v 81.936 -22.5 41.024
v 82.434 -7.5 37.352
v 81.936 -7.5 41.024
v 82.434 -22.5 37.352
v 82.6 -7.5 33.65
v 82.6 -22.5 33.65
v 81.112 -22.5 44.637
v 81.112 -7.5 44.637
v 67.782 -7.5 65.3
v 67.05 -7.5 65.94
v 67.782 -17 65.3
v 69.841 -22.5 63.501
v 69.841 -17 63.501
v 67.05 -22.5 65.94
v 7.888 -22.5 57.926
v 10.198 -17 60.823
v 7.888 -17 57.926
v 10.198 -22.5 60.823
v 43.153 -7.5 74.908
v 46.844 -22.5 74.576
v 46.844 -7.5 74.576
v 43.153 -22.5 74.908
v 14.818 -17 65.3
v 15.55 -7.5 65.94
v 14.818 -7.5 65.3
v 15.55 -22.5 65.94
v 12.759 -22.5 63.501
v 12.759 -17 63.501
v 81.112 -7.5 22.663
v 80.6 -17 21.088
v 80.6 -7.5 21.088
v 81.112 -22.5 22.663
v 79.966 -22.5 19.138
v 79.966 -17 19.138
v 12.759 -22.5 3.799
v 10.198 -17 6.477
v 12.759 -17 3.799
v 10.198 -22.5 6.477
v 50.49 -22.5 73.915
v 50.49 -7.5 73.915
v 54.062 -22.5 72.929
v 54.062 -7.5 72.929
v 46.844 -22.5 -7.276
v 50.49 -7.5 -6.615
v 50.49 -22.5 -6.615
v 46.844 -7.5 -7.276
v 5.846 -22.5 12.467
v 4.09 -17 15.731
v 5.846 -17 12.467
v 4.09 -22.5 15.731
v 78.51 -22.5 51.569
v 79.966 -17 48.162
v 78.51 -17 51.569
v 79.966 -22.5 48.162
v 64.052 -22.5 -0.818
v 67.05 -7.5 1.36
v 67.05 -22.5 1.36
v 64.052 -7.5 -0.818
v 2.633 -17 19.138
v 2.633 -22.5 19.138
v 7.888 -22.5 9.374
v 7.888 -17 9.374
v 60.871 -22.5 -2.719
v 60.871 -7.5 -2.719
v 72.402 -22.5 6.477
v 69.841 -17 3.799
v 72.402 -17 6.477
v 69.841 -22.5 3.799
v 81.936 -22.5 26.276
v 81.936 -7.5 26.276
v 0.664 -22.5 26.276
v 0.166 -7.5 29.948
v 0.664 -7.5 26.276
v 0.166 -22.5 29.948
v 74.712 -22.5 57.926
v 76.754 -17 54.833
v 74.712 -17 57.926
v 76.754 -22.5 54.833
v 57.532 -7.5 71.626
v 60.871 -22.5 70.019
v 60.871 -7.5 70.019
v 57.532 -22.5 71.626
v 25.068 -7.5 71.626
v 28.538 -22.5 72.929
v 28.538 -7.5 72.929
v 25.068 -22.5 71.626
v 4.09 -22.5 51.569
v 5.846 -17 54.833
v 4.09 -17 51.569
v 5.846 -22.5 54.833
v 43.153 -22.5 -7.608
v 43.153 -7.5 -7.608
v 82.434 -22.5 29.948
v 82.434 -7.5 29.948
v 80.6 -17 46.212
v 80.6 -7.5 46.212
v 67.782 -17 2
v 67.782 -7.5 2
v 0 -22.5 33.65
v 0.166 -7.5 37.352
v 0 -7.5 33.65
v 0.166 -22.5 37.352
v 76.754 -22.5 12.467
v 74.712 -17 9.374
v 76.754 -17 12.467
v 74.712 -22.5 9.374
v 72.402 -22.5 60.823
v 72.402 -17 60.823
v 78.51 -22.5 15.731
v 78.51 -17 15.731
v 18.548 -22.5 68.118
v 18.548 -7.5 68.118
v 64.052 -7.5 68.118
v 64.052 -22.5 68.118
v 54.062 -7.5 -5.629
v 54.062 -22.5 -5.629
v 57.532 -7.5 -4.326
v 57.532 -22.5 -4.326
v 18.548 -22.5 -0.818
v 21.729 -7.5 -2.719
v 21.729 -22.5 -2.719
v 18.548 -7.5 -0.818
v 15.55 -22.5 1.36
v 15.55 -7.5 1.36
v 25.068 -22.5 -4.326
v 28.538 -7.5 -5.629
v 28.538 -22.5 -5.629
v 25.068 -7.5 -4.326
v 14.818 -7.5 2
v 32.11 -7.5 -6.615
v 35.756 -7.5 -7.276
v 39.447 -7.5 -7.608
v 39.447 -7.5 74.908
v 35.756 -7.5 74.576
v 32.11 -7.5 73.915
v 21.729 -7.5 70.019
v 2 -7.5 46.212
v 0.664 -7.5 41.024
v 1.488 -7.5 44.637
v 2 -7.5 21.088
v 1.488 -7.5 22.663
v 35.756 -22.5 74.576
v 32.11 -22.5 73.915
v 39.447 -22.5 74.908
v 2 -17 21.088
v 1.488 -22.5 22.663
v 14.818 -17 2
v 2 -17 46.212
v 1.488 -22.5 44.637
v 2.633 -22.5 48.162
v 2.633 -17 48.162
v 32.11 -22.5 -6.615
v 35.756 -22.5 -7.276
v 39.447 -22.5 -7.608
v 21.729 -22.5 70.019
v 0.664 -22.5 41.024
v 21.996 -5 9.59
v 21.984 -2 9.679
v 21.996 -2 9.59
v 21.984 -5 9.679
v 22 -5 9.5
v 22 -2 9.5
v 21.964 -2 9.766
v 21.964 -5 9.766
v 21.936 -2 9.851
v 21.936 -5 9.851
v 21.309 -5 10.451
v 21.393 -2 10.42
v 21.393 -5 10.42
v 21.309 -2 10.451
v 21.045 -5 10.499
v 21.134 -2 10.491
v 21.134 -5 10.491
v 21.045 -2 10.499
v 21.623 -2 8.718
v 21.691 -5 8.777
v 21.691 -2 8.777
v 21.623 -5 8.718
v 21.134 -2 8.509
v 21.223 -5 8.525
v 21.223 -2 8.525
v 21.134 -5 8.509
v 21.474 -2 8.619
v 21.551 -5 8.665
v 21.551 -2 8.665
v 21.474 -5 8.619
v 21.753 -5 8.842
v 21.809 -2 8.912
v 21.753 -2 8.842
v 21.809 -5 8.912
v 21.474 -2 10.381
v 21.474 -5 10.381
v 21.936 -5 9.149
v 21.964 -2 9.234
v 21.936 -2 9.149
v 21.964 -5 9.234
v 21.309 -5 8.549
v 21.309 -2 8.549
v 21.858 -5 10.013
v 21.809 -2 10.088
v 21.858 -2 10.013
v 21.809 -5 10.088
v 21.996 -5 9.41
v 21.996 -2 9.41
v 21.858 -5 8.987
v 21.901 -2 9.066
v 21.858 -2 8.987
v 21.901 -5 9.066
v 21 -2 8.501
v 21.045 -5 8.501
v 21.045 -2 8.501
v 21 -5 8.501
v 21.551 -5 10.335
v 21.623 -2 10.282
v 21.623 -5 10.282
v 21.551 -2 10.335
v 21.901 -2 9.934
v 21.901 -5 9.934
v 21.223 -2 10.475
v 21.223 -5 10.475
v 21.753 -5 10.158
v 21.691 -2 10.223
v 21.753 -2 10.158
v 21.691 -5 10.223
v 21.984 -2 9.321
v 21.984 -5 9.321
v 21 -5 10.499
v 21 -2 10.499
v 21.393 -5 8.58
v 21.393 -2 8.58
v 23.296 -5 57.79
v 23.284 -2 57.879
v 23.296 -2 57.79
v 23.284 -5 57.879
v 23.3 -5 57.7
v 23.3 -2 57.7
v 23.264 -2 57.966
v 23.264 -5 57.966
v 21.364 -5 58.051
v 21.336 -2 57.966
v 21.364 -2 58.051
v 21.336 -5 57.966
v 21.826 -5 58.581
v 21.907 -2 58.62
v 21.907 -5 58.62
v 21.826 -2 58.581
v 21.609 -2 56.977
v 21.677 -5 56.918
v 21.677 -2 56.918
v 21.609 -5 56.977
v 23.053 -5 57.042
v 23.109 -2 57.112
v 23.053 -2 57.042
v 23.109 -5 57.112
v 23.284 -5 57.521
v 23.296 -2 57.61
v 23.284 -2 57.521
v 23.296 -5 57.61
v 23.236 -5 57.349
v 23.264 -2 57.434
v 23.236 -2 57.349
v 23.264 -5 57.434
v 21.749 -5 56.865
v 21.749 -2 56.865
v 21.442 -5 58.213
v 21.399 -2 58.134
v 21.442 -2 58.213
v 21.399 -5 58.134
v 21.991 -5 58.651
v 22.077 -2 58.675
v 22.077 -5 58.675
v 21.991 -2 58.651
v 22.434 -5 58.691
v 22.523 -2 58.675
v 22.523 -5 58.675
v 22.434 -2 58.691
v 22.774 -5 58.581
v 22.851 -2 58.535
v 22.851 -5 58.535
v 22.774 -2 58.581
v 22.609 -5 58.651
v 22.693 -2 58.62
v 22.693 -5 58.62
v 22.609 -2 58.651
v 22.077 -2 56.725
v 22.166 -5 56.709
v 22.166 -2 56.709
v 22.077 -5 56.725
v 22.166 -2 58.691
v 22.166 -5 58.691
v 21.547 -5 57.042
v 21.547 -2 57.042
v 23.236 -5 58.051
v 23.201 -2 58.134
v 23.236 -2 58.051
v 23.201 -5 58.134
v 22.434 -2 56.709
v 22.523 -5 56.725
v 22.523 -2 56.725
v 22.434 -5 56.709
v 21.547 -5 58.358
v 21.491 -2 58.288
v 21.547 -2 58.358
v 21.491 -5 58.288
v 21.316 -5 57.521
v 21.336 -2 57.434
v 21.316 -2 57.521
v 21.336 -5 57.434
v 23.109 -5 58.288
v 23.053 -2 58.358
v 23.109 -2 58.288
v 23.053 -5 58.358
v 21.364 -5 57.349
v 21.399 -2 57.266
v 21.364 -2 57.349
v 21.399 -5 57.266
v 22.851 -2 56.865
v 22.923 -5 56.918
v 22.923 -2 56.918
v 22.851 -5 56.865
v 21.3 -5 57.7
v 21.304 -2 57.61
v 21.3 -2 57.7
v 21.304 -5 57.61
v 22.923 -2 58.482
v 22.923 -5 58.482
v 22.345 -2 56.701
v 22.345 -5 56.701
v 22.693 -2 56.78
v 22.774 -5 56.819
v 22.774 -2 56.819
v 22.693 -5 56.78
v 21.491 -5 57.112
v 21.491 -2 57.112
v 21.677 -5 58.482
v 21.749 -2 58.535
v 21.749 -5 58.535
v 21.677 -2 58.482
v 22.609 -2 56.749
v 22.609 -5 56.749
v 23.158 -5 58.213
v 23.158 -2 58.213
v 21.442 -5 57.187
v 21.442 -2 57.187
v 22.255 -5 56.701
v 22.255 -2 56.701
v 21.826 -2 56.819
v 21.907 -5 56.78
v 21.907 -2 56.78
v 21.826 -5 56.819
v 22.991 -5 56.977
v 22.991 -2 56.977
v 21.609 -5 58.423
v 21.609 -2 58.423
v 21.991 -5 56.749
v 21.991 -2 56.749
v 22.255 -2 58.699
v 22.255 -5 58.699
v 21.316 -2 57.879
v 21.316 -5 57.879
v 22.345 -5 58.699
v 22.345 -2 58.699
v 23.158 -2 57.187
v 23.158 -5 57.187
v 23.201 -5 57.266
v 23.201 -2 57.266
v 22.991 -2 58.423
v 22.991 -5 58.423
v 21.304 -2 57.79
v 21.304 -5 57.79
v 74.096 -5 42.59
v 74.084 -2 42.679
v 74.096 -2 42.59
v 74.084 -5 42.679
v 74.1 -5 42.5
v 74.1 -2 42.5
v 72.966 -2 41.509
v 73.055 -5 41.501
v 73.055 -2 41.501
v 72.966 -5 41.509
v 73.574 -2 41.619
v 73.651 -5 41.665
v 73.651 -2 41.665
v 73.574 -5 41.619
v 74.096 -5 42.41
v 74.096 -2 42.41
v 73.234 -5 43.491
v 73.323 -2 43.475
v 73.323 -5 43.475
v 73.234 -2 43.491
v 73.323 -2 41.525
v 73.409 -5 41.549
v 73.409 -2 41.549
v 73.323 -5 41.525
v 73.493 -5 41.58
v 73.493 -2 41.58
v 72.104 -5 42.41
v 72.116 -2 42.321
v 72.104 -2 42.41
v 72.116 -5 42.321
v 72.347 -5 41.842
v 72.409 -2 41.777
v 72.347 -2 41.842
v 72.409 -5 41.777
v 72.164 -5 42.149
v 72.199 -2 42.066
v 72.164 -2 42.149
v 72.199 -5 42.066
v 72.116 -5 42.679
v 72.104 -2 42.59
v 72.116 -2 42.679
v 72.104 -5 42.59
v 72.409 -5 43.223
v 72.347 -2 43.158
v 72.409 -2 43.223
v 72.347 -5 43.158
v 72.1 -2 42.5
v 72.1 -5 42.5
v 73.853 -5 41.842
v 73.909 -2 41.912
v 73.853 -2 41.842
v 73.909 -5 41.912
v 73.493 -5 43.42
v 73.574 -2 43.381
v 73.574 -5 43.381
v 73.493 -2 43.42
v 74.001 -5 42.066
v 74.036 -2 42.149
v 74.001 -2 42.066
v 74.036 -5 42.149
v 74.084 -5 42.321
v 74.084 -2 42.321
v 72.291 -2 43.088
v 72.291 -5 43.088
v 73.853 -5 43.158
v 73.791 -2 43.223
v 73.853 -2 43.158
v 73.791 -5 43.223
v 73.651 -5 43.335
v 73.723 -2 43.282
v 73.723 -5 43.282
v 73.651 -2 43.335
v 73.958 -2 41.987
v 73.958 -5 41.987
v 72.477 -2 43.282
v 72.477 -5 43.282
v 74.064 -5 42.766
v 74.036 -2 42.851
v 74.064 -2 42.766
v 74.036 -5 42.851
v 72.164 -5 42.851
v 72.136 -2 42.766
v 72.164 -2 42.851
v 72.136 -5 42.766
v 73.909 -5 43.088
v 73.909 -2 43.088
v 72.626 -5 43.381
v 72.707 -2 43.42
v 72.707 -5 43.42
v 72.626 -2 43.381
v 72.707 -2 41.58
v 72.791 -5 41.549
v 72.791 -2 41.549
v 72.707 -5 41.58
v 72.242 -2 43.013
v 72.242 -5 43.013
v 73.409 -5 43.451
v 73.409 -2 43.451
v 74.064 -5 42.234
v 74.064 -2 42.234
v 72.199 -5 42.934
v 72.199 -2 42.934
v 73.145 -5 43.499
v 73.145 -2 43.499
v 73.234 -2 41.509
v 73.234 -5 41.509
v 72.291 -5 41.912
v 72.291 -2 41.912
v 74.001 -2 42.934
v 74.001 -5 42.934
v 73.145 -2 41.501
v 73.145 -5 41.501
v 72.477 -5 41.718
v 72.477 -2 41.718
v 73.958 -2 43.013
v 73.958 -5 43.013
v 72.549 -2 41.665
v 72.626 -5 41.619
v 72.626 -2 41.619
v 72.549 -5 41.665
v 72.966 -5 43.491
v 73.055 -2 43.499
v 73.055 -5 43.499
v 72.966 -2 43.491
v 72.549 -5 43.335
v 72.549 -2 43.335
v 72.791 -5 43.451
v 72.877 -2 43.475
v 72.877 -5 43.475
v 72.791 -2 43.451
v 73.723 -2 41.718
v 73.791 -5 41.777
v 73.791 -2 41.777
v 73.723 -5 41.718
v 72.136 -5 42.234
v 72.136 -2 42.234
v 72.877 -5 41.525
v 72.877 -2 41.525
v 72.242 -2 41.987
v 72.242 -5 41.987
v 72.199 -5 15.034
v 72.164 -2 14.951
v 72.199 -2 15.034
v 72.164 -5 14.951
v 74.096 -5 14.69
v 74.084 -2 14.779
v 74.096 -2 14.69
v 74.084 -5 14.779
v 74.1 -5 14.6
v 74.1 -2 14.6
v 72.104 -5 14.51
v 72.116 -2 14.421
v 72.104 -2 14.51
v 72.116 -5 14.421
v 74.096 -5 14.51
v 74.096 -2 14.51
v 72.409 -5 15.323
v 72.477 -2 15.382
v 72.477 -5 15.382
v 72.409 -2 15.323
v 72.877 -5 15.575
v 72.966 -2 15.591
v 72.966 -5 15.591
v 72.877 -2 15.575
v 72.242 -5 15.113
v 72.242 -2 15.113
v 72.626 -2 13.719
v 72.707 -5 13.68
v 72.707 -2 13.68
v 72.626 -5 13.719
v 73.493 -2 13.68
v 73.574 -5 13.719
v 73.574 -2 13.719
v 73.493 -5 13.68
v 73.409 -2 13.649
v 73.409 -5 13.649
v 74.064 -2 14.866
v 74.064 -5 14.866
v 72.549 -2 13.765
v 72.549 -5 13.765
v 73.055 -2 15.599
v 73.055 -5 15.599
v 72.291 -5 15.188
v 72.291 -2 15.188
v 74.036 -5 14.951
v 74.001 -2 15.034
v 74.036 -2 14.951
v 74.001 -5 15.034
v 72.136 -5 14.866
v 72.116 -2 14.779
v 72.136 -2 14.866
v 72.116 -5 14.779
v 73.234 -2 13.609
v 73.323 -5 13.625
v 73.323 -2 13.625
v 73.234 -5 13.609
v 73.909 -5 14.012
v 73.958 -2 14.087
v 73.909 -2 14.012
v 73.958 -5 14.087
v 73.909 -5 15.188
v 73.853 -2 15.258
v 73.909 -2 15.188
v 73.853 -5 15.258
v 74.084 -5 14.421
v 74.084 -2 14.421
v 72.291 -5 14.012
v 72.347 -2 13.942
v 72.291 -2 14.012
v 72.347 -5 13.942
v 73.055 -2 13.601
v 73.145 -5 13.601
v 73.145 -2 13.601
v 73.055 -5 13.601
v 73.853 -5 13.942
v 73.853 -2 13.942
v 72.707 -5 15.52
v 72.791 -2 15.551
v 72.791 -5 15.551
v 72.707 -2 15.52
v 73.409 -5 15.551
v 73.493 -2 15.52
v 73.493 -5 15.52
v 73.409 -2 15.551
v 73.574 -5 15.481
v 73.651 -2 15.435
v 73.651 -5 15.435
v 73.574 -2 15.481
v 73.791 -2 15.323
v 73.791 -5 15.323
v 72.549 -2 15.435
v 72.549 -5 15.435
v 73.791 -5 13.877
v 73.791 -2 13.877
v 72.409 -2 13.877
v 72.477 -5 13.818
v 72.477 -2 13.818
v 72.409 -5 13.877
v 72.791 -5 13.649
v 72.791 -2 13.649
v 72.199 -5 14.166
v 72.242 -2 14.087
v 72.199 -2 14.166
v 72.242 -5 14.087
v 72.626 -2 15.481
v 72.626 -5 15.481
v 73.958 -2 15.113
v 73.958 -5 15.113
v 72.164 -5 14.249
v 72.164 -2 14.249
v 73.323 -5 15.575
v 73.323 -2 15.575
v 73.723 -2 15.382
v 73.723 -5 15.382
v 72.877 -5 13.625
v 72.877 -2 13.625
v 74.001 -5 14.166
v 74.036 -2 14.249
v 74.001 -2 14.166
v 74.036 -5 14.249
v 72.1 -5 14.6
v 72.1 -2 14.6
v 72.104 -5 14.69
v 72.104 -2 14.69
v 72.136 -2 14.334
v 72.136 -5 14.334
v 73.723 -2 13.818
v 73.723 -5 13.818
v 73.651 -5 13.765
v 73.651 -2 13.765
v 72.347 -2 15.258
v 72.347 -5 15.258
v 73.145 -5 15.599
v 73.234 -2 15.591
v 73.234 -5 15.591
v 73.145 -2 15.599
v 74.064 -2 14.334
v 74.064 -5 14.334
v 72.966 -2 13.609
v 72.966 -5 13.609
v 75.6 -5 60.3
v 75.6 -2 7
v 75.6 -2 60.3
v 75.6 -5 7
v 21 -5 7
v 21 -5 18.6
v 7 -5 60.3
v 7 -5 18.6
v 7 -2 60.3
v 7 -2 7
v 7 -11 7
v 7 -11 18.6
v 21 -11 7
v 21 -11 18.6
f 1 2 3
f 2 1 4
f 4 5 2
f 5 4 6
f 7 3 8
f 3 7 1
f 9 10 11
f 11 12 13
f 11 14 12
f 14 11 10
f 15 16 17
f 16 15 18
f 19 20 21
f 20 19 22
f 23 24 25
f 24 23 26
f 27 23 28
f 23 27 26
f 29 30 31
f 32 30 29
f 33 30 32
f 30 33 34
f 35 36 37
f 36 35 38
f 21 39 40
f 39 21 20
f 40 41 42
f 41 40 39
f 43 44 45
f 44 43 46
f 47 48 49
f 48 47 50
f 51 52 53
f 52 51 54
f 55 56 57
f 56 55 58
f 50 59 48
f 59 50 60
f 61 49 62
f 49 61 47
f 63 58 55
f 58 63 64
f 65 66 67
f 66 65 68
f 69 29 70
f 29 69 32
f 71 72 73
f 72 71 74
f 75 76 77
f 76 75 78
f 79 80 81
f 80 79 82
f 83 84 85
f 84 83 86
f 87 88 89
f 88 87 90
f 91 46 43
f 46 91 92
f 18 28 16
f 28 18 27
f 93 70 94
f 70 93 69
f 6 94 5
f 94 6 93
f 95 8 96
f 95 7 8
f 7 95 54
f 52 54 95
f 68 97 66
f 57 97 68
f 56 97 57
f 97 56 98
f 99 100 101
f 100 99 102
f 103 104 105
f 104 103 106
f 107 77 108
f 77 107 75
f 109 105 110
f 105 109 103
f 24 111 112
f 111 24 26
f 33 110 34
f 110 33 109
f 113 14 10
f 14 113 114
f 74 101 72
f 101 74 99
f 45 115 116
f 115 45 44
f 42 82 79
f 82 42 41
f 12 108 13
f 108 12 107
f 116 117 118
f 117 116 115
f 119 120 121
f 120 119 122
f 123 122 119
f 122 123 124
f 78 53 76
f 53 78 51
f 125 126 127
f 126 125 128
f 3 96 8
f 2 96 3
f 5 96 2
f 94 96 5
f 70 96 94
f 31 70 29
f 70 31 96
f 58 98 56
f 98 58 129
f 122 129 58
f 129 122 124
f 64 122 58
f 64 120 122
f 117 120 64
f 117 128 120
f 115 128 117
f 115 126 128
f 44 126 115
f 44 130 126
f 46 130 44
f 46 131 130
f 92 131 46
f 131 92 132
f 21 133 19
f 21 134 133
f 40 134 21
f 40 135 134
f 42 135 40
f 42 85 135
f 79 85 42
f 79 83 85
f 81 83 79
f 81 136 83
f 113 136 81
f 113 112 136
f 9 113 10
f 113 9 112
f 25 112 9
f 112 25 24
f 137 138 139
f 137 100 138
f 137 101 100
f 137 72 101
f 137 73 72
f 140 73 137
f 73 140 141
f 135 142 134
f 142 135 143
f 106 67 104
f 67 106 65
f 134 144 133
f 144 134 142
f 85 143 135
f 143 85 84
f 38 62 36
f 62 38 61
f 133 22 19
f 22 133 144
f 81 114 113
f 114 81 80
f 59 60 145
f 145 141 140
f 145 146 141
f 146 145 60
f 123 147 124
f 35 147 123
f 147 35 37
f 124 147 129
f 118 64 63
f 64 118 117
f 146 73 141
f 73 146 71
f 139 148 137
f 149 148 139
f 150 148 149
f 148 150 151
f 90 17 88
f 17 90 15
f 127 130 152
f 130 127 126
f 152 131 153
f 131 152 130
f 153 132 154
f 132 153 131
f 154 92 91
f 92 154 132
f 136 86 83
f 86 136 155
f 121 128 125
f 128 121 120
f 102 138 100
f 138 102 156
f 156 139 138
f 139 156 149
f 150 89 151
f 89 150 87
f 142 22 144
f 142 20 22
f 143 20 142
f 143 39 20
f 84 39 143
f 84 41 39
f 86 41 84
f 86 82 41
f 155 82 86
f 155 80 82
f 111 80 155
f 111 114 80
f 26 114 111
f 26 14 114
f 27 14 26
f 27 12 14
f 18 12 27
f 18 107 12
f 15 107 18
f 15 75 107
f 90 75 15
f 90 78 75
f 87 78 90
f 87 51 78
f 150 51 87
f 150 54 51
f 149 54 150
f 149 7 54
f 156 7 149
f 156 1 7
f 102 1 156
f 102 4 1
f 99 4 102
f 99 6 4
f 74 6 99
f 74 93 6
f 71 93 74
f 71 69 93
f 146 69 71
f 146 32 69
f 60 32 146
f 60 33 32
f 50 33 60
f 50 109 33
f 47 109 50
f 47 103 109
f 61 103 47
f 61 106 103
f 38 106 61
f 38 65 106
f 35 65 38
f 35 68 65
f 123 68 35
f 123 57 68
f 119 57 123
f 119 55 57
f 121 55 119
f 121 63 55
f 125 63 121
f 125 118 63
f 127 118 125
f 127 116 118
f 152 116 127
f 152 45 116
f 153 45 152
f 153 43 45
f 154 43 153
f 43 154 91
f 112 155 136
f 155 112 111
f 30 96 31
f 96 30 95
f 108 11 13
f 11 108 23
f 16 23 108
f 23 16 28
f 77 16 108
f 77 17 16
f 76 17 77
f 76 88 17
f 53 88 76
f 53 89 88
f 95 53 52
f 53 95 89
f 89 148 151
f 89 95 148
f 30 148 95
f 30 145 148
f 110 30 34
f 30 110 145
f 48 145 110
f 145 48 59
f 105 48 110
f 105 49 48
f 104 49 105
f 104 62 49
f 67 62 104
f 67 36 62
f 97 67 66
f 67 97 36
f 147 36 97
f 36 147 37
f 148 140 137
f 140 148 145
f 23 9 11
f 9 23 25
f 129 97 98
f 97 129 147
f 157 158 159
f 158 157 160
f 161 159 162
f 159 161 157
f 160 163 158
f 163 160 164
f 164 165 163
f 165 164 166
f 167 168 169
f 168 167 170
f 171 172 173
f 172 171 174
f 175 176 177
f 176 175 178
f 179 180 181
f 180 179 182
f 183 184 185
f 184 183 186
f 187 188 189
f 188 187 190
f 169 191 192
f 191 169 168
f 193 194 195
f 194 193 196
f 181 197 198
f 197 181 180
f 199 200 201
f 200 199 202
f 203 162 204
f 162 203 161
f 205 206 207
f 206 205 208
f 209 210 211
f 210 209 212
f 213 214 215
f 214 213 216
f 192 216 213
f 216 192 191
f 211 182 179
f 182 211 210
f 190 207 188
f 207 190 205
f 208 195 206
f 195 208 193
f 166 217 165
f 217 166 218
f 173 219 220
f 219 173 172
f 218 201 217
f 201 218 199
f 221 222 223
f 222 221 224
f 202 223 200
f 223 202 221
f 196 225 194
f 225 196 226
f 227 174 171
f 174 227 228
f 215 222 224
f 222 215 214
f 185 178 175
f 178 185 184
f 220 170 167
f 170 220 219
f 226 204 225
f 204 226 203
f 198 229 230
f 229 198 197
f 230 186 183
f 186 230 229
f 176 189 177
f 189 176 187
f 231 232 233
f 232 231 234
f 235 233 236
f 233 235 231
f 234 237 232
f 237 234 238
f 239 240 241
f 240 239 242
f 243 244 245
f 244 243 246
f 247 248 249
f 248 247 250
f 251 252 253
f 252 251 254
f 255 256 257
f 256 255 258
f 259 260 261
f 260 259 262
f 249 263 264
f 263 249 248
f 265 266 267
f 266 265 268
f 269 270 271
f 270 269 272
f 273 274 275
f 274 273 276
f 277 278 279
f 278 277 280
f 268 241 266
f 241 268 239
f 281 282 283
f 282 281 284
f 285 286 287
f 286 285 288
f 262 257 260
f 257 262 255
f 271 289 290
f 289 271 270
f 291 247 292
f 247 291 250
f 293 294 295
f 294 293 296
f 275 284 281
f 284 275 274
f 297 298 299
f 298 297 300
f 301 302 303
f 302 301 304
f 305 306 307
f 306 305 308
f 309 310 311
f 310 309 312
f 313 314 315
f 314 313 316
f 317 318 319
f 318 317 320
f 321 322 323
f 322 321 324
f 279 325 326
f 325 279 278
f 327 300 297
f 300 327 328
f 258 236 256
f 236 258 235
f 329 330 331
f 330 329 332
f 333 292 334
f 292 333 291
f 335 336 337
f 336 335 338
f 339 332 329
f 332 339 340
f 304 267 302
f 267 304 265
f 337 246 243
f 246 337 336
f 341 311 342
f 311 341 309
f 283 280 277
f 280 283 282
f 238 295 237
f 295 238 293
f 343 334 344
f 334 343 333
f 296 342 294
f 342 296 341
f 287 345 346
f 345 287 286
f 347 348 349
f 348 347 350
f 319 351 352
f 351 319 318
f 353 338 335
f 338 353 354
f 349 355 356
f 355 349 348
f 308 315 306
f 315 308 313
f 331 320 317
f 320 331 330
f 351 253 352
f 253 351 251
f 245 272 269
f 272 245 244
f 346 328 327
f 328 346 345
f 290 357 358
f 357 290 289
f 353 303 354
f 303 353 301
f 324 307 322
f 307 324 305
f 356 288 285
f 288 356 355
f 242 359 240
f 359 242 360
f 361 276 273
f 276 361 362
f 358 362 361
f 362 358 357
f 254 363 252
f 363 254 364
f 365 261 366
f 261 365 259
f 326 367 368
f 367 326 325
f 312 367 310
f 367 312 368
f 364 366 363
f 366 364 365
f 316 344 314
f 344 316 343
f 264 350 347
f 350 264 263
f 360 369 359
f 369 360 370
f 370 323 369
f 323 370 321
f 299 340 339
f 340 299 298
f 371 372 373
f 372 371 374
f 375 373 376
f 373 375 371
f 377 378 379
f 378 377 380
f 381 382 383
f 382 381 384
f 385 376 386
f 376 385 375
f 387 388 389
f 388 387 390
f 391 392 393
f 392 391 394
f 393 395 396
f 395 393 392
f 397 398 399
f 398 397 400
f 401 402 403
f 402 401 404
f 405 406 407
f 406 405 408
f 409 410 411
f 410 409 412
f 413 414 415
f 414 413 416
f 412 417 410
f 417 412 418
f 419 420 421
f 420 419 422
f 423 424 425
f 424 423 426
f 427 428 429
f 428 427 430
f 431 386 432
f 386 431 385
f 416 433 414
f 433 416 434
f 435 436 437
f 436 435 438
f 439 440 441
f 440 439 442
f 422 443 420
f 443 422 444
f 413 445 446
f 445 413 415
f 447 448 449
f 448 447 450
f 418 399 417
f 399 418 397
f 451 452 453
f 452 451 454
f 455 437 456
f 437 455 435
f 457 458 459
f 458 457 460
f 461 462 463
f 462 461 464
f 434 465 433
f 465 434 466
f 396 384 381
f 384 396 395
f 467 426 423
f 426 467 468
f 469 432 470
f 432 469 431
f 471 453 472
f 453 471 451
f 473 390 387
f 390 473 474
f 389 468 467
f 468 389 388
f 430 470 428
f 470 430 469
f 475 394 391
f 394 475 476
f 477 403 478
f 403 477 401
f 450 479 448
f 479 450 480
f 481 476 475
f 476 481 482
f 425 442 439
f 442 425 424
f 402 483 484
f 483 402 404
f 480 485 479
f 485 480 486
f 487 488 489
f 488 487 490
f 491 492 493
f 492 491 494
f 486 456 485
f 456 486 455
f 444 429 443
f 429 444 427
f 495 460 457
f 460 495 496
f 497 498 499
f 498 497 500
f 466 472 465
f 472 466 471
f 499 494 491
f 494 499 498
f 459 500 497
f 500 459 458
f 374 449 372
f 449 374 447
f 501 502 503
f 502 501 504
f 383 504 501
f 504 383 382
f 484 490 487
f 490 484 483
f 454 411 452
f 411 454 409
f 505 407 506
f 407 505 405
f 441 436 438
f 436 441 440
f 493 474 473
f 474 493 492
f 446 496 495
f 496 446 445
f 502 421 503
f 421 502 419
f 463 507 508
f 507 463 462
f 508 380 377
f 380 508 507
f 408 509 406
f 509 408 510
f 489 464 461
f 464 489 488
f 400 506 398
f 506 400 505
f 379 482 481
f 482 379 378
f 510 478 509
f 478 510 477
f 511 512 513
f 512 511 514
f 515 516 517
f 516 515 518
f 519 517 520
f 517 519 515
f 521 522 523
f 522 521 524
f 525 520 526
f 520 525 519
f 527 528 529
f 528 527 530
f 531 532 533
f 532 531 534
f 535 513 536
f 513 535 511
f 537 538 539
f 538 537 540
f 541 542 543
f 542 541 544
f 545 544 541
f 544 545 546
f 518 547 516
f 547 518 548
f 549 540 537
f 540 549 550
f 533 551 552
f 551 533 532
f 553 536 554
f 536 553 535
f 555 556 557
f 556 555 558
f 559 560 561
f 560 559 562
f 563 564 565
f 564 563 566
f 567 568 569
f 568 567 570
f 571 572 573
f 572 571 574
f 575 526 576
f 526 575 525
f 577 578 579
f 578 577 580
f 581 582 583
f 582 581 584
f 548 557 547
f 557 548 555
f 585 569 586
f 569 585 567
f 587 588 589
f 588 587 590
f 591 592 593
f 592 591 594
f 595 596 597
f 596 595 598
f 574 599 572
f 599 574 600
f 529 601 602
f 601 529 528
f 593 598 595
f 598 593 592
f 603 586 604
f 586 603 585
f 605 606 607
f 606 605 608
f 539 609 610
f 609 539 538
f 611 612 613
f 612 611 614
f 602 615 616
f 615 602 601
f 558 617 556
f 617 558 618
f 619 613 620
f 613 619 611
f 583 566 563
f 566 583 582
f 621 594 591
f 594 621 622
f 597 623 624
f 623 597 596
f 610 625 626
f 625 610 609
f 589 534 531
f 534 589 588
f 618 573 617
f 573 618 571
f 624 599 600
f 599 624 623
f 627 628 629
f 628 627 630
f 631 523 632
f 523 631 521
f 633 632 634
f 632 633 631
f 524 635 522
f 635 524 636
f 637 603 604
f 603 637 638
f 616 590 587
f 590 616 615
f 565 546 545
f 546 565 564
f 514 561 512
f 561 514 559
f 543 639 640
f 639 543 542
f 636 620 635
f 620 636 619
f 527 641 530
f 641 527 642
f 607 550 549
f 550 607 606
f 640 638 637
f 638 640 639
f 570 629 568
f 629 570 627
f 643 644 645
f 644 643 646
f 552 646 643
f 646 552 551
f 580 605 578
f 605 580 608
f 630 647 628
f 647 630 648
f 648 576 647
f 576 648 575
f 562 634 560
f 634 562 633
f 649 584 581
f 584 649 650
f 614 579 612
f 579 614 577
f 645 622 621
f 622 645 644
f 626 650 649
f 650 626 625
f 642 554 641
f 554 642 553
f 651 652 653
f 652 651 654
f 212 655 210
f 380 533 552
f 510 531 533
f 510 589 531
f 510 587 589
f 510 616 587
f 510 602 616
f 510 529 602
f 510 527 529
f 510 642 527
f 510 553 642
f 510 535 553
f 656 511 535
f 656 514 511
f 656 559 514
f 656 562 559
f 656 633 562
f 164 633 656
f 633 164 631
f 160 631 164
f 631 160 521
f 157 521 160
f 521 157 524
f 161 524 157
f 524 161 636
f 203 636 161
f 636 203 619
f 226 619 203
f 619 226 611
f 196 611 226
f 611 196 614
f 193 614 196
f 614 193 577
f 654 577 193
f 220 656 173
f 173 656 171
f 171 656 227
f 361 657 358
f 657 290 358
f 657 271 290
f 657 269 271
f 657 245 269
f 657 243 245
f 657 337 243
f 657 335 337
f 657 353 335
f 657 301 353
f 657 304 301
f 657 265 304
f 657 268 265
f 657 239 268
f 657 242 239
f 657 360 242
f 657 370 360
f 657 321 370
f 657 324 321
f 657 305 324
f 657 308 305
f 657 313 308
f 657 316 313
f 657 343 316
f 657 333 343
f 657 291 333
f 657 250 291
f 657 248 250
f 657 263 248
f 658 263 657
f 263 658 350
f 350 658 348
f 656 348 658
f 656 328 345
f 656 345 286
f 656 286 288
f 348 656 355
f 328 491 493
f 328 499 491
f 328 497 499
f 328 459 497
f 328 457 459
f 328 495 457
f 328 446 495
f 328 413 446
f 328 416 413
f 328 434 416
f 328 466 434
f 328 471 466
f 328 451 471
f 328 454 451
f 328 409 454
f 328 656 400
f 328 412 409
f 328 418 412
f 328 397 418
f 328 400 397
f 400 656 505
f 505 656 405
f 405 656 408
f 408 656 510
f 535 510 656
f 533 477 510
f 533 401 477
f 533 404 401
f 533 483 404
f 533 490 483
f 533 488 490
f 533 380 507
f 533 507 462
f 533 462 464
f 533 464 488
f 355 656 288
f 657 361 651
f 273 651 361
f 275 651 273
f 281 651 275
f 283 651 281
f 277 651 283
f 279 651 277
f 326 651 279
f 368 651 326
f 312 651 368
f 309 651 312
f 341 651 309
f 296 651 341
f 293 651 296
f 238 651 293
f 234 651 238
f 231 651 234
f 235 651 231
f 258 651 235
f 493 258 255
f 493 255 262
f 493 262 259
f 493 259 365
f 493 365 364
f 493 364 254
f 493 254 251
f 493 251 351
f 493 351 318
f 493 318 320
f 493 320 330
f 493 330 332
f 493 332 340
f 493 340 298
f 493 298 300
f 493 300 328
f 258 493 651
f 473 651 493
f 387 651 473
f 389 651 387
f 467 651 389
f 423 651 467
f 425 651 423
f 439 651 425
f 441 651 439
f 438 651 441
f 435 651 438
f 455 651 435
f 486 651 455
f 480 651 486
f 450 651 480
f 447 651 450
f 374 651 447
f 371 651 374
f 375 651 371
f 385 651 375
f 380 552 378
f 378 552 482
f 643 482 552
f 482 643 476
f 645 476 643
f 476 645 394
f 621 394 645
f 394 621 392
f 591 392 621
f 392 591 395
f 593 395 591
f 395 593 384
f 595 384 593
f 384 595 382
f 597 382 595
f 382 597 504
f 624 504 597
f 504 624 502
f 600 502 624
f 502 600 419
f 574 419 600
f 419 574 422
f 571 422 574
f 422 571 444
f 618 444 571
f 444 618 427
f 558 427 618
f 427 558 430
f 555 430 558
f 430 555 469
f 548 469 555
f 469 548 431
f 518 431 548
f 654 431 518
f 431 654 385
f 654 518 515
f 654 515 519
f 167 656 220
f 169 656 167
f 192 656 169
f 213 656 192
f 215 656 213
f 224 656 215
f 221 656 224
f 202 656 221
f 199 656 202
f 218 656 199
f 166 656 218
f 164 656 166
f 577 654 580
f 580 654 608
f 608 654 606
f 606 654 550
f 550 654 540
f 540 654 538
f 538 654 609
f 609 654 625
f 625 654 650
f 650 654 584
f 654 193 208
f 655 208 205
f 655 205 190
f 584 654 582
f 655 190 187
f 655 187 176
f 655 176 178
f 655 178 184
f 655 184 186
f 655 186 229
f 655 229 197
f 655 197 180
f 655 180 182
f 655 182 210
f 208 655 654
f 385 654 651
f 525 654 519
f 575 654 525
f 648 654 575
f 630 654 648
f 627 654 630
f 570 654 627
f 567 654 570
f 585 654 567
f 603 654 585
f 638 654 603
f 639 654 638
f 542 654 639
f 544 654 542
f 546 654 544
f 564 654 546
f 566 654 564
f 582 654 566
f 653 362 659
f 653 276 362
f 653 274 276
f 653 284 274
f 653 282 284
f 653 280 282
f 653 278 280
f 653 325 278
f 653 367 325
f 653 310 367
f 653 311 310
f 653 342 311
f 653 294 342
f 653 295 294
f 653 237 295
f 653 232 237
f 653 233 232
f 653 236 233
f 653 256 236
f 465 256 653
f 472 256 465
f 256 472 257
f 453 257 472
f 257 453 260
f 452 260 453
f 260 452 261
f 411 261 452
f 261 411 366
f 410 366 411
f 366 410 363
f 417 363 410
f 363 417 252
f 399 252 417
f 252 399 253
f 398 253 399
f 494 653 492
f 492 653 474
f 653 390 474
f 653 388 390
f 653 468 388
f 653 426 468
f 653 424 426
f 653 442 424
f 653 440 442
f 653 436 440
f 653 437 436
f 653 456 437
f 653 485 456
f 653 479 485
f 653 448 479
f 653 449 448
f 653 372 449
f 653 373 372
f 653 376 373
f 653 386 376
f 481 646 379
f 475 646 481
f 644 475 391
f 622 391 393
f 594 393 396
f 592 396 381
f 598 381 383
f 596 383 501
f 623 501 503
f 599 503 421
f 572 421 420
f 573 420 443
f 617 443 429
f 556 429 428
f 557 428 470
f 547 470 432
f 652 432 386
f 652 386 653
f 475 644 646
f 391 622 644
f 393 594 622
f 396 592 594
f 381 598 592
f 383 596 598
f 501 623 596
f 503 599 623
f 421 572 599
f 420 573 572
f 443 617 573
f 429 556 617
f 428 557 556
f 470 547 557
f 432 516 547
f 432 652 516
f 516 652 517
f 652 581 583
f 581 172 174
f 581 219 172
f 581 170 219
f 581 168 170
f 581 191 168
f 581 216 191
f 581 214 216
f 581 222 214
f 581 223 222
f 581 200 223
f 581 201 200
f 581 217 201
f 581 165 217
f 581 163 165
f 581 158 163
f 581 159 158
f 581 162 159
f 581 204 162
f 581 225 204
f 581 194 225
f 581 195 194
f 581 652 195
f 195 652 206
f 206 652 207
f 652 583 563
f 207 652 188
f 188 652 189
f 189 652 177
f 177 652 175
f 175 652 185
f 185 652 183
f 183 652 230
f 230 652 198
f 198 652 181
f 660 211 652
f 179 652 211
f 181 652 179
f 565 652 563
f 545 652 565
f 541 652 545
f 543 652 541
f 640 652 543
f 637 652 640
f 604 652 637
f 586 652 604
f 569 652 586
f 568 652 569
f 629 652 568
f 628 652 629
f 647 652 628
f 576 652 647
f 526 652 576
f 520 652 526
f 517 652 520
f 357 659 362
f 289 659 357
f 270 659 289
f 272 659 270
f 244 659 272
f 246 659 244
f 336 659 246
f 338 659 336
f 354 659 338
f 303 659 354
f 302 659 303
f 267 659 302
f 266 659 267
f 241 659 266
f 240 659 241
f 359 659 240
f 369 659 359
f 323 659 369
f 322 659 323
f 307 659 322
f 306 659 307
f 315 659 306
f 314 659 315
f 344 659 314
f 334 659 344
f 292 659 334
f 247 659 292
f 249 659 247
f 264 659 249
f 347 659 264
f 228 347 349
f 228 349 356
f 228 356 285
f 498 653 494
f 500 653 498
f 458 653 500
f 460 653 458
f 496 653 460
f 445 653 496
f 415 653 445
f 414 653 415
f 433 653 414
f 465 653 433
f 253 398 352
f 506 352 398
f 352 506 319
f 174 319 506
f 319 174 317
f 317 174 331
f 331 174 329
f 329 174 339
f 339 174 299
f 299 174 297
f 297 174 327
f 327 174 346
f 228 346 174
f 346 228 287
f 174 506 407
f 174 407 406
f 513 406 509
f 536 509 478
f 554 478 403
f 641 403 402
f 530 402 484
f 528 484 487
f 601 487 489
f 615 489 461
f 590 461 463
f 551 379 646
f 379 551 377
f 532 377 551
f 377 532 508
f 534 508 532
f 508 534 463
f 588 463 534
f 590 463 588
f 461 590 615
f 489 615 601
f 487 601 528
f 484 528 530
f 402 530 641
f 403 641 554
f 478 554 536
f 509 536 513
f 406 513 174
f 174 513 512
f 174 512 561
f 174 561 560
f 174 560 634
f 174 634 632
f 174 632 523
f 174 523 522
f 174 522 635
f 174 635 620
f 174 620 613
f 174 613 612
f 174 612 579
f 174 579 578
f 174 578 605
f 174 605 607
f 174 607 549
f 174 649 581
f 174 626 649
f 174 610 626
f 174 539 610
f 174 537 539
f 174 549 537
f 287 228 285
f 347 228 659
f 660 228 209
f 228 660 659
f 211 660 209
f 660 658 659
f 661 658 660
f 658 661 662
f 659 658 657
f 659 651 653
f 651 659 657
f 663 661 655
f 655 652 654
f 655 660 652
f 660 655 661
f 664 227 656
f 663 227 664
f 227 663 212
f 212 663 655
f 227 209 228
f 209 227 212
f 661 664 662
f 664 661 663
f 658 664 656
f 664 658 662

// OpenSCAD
// Noami Yescas
// 08-17-2021
// Box or holder for arduino, relay and rotation stage switches

$fn= 70;

//Arduino dimensions
arduinox = 68.6;
arduinoy = 53.3;
arduinoz = 3;

usbx = 14;
usby = 11.6;
usbz = 9;

// Box dimensions
boxThickness = 2;
boxx = arduinox + boxThickness*2 +10;
boxy = arduinoy + boxThickness*2 +10;
boxz = 15;

// Hole positions
holediam = 3.2;
h1x = 14;
h1y = 2.5;
h2x = h1x + 1.3;
h3x = h2x + 50.8;
h4y = h1y + 5.1;
h4x = h3x;
h3y = h4y + 27.9;
h2y = h3y + 15.2;




module Hole(holediam){
    cylinder(d = holediam,h=arduinoz+.1);
}

module PlaceHole(holenum){
    // Populates hole coordinates of desired hole number
    //  *2   .3
    // *1    *4
    if (holenum <= 4 && holenum >= 1){
        positions = [[h1x,h1y],[h2x,h2y],[h3x,h3y],[h4x,h4y]];
        hx = positions[holenum-1][0];
        hy = positions[holenum-1][1];
        translate([hx,hy,-0.05]) 
            Hole();
    }
}

module FourHoles(){
        // Bottom Left hole
        PlaceHole(1);
        // Top Left hole
        PlaceHole(2);
        // Top Right hole
        PlaceHole(3);
        // Bottom Right Hole
        PlaceHole(4);
}

module Arduino(){

        difference(){
            cube([arduinox, arduinoy, arduinoz]);
            FourHoles();
        }
            cube([usbx,usby,usbz]);
    
}

module OutsideBox(){
    translate([boxx/2,boxy/2,boxz/2])cylinder(d=boxx,h=boxz);     
}

module InsideBox(){
    translate([boxThickness,boxThickness,boxThickness])
        cube([boxx-boxThickness*2, boxy-boxThickness*2, boxz]);
}



rotate([90,0,0]){
    // Cut a hole in the outerbox 
    difference(){    
        OutsideBox();        
        InsideBox();
        translate([boxx/2-arduinox/2,boxy/2-arduinoy/2,-0.1])
            FourHoles();
    }
    // Put the arduino model inside
    translate([boxx/2-arduinox/2,boxy/2-arduinoy/2,boxThickness])
            Arduino();
}
